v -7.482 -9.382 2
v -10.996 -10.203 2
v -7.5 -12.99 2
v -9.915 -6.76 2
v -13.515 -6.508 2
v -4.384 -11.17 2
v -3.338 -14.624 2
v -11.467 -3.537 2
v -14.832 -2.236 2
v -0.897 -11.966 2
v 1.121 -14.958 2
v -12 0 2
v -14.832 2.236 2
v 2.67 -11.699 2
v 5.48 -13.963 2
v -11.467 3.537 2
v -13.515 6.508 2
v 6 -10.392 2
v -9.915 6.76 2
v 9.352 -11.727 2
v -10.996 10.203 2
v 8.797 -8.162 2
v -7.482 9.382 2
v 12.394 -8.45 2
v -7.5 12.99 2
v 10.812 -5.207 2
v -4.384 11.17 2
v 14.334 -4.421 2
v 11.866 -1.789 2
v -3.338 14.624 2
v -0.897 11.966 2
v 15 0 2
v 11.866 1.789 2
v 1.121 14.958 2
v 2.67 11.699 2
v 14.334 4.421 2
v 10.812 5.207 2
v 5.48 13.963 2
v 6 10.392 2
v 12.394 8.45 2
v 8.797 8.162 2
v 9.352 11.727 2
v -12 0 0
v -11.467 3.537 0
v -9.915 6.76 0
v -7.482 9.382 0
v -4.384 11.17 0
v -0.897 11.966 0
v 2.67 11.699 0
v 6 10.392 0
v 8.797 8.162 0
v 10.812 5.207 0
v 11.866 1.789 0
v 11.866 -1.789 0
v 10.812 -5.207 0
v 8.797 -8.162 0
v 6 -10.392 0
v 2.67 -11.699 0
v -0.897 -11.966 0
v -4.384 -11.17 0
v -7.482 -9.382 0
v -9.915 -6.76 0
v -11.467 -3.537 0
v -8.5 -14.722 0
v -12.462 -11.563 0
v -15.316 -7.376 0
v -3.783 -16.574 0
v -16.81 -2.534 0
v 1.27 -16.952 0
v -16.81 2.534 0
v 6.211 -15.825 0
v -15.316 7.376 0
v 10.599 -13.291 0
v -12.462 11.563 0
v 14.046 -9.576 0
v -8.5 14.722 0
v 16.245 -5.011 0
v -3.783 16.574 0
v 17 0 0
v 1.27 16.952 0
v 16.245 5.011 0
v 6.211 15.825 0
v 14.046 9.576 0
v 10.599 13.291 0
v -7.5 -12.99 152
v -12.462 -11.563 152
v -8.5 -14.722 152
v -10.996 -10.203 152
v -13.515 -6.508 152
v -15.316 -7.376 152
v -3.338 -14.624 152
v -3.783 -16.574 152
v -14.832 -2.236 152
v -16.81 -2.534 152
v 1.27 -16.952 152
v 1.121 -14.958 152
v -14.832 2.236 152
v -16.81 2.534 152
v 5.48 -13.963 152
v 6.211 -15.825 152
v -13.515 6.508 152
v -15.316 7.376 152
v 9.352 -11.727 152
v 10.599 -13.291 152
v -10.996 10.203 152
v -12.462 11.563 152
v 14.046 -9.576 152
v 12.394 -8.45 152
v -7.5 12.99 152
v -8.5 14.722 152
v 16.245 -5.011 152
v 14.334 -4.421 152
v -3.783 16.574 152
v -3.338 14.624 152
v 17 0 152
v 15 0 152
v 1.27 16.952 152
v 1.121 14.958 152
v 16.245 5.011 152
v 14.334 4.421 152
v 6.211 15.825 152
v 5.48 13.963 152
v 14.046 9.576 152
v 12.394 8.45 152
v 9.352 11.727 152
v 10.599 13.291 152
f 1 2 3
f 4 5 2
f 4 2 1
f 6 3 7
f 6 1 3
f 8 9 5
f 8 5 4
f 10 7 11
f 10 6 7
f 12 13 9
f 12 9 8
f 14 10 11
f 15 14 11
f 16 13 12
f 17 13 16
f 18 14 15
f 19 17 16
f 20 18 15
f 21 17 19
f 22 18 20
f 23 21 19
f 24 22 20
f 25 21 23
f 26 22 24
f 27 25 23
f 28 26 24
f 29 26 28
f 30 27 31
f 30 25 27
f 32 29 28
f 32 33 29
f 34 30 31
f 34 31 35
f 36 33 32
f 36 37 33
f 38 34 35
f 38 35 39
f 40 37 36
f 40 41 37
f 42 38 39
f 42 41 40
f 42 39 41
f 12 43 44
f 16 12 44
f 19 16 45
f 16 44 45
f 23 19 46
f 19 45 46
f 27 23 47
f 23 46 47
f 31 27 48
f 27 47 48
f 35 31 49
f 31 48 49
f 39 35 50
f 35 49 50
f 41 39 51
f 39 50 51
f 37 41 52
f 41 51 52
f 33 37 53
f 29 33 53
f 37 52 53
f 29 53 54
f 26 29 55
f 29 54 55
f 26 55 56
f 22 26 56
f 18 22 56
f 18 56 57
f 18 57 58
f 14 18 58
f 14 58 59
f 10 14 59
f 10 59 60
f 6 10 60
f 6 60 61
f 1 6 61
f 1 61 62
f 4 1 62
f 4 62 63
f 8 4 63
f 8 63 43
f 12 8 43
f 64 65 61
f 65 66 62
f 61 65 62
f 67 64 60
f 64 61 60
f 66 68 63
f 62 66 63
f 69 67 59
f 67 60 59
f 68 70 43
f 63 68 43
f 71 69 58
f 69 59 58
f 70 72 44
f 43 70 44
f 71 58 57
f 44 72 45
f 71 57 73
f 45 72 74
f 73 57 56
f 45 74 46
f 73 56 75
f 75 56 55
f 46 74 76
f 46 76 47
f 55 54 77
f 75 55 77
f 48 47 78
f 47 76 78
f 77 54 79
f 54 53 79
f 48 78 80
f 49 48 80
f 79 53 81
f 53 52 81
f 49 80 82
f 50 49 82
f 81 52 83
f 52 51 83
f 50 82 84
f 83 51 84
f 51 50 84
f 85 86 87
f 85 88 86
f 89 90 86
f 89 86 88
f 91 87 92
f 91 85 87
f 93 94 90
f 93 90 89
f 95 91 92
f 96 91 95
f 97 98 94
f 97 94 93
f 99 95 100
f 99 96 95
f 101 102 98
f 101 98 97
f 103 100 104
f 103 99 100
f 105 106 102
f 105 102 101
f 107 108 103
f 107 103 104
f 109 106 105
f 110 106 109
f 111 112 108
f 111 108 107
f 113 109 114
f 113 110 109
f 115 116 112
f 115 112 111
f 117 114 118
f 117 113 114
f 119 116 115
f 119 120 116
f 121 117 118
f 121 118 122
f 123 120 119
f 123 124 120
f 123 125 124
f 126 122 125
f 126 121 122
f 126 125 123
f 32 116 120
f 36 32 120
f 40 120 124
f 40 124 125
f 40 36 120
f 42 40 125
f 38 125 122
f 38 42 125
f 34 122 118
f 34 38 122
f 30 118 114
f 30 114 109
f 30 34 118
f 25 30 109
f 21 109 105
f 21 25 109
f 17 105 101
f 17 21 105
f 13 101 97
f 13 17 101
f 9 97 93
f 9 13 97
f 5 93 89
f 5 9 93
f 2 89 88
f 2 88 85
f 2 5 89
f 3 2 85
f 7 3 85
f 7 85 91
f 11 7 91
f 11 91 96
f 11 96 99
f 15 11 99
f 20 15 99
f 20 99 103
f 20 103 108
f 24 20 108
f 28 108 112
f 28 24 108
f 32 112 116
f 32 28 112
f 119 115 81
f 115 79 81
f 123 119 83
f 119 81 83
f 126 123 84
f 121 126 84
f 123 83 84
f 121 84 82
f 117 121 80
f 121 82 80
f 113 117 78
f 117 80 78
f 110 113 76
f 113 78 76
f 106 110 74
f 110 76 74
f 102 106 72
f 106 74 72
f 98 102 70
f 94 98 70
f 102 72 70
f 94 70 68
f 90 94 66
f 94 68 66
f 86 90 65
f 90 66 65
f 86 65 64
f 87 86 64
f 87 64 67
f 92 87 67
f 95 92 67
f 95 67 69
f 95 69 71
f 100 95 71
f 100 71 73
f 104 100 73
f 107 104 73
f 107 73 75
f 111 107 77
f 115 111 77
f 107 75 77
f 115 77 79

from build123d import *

# Parameters (mm, degrees)
ESQUISSE1_R             = 17
BOSS_EXTRU_1_DEPTH      = 2
ESQUISSE2_R             = 17
ESQUISSE2_R_2           = 15
BOSS_EXTRU_2_DEPTH      = 150
ESQUISSE3_R             = 12
ENL_V_MAT_EXTRU_1_DEPTH = 150


with BuildPart() as part:
    # Esquisse1 → Boss.-Extru.1 (new body)
    with BuildSketch(Plane.XY):
        Circle(ESQUISSE1_R)
    extrude(amount=BOSS_EXTRU_1_DEPTH)

    # Esquisse2 → Boss.-Extru.2 (add)
    with BuildSketch(Plane.XY.offset(2)):
        Circle(ESQUISSE2_R)
        Circle(ESQUISSE2_R_2, mode=Mode.SUBTRACT)
    extrude(amount=BOSS_EXTRU_2_DEPTH)

    # Esquisse3 → Enlèv. mat.-Extru.1 (cut)
    with BuildSketch(Plane(origin=(0, 0, 0), x_dir=(-1, 0, 0), z_dir=(0, 0, -1))):
        Circle(ESQUISSE3_R)
    extrude(amount=-ENL_V_MAT_EXTRU_1_DEPTH, mode=Mode.SUBTRACT)


solid = part.part
